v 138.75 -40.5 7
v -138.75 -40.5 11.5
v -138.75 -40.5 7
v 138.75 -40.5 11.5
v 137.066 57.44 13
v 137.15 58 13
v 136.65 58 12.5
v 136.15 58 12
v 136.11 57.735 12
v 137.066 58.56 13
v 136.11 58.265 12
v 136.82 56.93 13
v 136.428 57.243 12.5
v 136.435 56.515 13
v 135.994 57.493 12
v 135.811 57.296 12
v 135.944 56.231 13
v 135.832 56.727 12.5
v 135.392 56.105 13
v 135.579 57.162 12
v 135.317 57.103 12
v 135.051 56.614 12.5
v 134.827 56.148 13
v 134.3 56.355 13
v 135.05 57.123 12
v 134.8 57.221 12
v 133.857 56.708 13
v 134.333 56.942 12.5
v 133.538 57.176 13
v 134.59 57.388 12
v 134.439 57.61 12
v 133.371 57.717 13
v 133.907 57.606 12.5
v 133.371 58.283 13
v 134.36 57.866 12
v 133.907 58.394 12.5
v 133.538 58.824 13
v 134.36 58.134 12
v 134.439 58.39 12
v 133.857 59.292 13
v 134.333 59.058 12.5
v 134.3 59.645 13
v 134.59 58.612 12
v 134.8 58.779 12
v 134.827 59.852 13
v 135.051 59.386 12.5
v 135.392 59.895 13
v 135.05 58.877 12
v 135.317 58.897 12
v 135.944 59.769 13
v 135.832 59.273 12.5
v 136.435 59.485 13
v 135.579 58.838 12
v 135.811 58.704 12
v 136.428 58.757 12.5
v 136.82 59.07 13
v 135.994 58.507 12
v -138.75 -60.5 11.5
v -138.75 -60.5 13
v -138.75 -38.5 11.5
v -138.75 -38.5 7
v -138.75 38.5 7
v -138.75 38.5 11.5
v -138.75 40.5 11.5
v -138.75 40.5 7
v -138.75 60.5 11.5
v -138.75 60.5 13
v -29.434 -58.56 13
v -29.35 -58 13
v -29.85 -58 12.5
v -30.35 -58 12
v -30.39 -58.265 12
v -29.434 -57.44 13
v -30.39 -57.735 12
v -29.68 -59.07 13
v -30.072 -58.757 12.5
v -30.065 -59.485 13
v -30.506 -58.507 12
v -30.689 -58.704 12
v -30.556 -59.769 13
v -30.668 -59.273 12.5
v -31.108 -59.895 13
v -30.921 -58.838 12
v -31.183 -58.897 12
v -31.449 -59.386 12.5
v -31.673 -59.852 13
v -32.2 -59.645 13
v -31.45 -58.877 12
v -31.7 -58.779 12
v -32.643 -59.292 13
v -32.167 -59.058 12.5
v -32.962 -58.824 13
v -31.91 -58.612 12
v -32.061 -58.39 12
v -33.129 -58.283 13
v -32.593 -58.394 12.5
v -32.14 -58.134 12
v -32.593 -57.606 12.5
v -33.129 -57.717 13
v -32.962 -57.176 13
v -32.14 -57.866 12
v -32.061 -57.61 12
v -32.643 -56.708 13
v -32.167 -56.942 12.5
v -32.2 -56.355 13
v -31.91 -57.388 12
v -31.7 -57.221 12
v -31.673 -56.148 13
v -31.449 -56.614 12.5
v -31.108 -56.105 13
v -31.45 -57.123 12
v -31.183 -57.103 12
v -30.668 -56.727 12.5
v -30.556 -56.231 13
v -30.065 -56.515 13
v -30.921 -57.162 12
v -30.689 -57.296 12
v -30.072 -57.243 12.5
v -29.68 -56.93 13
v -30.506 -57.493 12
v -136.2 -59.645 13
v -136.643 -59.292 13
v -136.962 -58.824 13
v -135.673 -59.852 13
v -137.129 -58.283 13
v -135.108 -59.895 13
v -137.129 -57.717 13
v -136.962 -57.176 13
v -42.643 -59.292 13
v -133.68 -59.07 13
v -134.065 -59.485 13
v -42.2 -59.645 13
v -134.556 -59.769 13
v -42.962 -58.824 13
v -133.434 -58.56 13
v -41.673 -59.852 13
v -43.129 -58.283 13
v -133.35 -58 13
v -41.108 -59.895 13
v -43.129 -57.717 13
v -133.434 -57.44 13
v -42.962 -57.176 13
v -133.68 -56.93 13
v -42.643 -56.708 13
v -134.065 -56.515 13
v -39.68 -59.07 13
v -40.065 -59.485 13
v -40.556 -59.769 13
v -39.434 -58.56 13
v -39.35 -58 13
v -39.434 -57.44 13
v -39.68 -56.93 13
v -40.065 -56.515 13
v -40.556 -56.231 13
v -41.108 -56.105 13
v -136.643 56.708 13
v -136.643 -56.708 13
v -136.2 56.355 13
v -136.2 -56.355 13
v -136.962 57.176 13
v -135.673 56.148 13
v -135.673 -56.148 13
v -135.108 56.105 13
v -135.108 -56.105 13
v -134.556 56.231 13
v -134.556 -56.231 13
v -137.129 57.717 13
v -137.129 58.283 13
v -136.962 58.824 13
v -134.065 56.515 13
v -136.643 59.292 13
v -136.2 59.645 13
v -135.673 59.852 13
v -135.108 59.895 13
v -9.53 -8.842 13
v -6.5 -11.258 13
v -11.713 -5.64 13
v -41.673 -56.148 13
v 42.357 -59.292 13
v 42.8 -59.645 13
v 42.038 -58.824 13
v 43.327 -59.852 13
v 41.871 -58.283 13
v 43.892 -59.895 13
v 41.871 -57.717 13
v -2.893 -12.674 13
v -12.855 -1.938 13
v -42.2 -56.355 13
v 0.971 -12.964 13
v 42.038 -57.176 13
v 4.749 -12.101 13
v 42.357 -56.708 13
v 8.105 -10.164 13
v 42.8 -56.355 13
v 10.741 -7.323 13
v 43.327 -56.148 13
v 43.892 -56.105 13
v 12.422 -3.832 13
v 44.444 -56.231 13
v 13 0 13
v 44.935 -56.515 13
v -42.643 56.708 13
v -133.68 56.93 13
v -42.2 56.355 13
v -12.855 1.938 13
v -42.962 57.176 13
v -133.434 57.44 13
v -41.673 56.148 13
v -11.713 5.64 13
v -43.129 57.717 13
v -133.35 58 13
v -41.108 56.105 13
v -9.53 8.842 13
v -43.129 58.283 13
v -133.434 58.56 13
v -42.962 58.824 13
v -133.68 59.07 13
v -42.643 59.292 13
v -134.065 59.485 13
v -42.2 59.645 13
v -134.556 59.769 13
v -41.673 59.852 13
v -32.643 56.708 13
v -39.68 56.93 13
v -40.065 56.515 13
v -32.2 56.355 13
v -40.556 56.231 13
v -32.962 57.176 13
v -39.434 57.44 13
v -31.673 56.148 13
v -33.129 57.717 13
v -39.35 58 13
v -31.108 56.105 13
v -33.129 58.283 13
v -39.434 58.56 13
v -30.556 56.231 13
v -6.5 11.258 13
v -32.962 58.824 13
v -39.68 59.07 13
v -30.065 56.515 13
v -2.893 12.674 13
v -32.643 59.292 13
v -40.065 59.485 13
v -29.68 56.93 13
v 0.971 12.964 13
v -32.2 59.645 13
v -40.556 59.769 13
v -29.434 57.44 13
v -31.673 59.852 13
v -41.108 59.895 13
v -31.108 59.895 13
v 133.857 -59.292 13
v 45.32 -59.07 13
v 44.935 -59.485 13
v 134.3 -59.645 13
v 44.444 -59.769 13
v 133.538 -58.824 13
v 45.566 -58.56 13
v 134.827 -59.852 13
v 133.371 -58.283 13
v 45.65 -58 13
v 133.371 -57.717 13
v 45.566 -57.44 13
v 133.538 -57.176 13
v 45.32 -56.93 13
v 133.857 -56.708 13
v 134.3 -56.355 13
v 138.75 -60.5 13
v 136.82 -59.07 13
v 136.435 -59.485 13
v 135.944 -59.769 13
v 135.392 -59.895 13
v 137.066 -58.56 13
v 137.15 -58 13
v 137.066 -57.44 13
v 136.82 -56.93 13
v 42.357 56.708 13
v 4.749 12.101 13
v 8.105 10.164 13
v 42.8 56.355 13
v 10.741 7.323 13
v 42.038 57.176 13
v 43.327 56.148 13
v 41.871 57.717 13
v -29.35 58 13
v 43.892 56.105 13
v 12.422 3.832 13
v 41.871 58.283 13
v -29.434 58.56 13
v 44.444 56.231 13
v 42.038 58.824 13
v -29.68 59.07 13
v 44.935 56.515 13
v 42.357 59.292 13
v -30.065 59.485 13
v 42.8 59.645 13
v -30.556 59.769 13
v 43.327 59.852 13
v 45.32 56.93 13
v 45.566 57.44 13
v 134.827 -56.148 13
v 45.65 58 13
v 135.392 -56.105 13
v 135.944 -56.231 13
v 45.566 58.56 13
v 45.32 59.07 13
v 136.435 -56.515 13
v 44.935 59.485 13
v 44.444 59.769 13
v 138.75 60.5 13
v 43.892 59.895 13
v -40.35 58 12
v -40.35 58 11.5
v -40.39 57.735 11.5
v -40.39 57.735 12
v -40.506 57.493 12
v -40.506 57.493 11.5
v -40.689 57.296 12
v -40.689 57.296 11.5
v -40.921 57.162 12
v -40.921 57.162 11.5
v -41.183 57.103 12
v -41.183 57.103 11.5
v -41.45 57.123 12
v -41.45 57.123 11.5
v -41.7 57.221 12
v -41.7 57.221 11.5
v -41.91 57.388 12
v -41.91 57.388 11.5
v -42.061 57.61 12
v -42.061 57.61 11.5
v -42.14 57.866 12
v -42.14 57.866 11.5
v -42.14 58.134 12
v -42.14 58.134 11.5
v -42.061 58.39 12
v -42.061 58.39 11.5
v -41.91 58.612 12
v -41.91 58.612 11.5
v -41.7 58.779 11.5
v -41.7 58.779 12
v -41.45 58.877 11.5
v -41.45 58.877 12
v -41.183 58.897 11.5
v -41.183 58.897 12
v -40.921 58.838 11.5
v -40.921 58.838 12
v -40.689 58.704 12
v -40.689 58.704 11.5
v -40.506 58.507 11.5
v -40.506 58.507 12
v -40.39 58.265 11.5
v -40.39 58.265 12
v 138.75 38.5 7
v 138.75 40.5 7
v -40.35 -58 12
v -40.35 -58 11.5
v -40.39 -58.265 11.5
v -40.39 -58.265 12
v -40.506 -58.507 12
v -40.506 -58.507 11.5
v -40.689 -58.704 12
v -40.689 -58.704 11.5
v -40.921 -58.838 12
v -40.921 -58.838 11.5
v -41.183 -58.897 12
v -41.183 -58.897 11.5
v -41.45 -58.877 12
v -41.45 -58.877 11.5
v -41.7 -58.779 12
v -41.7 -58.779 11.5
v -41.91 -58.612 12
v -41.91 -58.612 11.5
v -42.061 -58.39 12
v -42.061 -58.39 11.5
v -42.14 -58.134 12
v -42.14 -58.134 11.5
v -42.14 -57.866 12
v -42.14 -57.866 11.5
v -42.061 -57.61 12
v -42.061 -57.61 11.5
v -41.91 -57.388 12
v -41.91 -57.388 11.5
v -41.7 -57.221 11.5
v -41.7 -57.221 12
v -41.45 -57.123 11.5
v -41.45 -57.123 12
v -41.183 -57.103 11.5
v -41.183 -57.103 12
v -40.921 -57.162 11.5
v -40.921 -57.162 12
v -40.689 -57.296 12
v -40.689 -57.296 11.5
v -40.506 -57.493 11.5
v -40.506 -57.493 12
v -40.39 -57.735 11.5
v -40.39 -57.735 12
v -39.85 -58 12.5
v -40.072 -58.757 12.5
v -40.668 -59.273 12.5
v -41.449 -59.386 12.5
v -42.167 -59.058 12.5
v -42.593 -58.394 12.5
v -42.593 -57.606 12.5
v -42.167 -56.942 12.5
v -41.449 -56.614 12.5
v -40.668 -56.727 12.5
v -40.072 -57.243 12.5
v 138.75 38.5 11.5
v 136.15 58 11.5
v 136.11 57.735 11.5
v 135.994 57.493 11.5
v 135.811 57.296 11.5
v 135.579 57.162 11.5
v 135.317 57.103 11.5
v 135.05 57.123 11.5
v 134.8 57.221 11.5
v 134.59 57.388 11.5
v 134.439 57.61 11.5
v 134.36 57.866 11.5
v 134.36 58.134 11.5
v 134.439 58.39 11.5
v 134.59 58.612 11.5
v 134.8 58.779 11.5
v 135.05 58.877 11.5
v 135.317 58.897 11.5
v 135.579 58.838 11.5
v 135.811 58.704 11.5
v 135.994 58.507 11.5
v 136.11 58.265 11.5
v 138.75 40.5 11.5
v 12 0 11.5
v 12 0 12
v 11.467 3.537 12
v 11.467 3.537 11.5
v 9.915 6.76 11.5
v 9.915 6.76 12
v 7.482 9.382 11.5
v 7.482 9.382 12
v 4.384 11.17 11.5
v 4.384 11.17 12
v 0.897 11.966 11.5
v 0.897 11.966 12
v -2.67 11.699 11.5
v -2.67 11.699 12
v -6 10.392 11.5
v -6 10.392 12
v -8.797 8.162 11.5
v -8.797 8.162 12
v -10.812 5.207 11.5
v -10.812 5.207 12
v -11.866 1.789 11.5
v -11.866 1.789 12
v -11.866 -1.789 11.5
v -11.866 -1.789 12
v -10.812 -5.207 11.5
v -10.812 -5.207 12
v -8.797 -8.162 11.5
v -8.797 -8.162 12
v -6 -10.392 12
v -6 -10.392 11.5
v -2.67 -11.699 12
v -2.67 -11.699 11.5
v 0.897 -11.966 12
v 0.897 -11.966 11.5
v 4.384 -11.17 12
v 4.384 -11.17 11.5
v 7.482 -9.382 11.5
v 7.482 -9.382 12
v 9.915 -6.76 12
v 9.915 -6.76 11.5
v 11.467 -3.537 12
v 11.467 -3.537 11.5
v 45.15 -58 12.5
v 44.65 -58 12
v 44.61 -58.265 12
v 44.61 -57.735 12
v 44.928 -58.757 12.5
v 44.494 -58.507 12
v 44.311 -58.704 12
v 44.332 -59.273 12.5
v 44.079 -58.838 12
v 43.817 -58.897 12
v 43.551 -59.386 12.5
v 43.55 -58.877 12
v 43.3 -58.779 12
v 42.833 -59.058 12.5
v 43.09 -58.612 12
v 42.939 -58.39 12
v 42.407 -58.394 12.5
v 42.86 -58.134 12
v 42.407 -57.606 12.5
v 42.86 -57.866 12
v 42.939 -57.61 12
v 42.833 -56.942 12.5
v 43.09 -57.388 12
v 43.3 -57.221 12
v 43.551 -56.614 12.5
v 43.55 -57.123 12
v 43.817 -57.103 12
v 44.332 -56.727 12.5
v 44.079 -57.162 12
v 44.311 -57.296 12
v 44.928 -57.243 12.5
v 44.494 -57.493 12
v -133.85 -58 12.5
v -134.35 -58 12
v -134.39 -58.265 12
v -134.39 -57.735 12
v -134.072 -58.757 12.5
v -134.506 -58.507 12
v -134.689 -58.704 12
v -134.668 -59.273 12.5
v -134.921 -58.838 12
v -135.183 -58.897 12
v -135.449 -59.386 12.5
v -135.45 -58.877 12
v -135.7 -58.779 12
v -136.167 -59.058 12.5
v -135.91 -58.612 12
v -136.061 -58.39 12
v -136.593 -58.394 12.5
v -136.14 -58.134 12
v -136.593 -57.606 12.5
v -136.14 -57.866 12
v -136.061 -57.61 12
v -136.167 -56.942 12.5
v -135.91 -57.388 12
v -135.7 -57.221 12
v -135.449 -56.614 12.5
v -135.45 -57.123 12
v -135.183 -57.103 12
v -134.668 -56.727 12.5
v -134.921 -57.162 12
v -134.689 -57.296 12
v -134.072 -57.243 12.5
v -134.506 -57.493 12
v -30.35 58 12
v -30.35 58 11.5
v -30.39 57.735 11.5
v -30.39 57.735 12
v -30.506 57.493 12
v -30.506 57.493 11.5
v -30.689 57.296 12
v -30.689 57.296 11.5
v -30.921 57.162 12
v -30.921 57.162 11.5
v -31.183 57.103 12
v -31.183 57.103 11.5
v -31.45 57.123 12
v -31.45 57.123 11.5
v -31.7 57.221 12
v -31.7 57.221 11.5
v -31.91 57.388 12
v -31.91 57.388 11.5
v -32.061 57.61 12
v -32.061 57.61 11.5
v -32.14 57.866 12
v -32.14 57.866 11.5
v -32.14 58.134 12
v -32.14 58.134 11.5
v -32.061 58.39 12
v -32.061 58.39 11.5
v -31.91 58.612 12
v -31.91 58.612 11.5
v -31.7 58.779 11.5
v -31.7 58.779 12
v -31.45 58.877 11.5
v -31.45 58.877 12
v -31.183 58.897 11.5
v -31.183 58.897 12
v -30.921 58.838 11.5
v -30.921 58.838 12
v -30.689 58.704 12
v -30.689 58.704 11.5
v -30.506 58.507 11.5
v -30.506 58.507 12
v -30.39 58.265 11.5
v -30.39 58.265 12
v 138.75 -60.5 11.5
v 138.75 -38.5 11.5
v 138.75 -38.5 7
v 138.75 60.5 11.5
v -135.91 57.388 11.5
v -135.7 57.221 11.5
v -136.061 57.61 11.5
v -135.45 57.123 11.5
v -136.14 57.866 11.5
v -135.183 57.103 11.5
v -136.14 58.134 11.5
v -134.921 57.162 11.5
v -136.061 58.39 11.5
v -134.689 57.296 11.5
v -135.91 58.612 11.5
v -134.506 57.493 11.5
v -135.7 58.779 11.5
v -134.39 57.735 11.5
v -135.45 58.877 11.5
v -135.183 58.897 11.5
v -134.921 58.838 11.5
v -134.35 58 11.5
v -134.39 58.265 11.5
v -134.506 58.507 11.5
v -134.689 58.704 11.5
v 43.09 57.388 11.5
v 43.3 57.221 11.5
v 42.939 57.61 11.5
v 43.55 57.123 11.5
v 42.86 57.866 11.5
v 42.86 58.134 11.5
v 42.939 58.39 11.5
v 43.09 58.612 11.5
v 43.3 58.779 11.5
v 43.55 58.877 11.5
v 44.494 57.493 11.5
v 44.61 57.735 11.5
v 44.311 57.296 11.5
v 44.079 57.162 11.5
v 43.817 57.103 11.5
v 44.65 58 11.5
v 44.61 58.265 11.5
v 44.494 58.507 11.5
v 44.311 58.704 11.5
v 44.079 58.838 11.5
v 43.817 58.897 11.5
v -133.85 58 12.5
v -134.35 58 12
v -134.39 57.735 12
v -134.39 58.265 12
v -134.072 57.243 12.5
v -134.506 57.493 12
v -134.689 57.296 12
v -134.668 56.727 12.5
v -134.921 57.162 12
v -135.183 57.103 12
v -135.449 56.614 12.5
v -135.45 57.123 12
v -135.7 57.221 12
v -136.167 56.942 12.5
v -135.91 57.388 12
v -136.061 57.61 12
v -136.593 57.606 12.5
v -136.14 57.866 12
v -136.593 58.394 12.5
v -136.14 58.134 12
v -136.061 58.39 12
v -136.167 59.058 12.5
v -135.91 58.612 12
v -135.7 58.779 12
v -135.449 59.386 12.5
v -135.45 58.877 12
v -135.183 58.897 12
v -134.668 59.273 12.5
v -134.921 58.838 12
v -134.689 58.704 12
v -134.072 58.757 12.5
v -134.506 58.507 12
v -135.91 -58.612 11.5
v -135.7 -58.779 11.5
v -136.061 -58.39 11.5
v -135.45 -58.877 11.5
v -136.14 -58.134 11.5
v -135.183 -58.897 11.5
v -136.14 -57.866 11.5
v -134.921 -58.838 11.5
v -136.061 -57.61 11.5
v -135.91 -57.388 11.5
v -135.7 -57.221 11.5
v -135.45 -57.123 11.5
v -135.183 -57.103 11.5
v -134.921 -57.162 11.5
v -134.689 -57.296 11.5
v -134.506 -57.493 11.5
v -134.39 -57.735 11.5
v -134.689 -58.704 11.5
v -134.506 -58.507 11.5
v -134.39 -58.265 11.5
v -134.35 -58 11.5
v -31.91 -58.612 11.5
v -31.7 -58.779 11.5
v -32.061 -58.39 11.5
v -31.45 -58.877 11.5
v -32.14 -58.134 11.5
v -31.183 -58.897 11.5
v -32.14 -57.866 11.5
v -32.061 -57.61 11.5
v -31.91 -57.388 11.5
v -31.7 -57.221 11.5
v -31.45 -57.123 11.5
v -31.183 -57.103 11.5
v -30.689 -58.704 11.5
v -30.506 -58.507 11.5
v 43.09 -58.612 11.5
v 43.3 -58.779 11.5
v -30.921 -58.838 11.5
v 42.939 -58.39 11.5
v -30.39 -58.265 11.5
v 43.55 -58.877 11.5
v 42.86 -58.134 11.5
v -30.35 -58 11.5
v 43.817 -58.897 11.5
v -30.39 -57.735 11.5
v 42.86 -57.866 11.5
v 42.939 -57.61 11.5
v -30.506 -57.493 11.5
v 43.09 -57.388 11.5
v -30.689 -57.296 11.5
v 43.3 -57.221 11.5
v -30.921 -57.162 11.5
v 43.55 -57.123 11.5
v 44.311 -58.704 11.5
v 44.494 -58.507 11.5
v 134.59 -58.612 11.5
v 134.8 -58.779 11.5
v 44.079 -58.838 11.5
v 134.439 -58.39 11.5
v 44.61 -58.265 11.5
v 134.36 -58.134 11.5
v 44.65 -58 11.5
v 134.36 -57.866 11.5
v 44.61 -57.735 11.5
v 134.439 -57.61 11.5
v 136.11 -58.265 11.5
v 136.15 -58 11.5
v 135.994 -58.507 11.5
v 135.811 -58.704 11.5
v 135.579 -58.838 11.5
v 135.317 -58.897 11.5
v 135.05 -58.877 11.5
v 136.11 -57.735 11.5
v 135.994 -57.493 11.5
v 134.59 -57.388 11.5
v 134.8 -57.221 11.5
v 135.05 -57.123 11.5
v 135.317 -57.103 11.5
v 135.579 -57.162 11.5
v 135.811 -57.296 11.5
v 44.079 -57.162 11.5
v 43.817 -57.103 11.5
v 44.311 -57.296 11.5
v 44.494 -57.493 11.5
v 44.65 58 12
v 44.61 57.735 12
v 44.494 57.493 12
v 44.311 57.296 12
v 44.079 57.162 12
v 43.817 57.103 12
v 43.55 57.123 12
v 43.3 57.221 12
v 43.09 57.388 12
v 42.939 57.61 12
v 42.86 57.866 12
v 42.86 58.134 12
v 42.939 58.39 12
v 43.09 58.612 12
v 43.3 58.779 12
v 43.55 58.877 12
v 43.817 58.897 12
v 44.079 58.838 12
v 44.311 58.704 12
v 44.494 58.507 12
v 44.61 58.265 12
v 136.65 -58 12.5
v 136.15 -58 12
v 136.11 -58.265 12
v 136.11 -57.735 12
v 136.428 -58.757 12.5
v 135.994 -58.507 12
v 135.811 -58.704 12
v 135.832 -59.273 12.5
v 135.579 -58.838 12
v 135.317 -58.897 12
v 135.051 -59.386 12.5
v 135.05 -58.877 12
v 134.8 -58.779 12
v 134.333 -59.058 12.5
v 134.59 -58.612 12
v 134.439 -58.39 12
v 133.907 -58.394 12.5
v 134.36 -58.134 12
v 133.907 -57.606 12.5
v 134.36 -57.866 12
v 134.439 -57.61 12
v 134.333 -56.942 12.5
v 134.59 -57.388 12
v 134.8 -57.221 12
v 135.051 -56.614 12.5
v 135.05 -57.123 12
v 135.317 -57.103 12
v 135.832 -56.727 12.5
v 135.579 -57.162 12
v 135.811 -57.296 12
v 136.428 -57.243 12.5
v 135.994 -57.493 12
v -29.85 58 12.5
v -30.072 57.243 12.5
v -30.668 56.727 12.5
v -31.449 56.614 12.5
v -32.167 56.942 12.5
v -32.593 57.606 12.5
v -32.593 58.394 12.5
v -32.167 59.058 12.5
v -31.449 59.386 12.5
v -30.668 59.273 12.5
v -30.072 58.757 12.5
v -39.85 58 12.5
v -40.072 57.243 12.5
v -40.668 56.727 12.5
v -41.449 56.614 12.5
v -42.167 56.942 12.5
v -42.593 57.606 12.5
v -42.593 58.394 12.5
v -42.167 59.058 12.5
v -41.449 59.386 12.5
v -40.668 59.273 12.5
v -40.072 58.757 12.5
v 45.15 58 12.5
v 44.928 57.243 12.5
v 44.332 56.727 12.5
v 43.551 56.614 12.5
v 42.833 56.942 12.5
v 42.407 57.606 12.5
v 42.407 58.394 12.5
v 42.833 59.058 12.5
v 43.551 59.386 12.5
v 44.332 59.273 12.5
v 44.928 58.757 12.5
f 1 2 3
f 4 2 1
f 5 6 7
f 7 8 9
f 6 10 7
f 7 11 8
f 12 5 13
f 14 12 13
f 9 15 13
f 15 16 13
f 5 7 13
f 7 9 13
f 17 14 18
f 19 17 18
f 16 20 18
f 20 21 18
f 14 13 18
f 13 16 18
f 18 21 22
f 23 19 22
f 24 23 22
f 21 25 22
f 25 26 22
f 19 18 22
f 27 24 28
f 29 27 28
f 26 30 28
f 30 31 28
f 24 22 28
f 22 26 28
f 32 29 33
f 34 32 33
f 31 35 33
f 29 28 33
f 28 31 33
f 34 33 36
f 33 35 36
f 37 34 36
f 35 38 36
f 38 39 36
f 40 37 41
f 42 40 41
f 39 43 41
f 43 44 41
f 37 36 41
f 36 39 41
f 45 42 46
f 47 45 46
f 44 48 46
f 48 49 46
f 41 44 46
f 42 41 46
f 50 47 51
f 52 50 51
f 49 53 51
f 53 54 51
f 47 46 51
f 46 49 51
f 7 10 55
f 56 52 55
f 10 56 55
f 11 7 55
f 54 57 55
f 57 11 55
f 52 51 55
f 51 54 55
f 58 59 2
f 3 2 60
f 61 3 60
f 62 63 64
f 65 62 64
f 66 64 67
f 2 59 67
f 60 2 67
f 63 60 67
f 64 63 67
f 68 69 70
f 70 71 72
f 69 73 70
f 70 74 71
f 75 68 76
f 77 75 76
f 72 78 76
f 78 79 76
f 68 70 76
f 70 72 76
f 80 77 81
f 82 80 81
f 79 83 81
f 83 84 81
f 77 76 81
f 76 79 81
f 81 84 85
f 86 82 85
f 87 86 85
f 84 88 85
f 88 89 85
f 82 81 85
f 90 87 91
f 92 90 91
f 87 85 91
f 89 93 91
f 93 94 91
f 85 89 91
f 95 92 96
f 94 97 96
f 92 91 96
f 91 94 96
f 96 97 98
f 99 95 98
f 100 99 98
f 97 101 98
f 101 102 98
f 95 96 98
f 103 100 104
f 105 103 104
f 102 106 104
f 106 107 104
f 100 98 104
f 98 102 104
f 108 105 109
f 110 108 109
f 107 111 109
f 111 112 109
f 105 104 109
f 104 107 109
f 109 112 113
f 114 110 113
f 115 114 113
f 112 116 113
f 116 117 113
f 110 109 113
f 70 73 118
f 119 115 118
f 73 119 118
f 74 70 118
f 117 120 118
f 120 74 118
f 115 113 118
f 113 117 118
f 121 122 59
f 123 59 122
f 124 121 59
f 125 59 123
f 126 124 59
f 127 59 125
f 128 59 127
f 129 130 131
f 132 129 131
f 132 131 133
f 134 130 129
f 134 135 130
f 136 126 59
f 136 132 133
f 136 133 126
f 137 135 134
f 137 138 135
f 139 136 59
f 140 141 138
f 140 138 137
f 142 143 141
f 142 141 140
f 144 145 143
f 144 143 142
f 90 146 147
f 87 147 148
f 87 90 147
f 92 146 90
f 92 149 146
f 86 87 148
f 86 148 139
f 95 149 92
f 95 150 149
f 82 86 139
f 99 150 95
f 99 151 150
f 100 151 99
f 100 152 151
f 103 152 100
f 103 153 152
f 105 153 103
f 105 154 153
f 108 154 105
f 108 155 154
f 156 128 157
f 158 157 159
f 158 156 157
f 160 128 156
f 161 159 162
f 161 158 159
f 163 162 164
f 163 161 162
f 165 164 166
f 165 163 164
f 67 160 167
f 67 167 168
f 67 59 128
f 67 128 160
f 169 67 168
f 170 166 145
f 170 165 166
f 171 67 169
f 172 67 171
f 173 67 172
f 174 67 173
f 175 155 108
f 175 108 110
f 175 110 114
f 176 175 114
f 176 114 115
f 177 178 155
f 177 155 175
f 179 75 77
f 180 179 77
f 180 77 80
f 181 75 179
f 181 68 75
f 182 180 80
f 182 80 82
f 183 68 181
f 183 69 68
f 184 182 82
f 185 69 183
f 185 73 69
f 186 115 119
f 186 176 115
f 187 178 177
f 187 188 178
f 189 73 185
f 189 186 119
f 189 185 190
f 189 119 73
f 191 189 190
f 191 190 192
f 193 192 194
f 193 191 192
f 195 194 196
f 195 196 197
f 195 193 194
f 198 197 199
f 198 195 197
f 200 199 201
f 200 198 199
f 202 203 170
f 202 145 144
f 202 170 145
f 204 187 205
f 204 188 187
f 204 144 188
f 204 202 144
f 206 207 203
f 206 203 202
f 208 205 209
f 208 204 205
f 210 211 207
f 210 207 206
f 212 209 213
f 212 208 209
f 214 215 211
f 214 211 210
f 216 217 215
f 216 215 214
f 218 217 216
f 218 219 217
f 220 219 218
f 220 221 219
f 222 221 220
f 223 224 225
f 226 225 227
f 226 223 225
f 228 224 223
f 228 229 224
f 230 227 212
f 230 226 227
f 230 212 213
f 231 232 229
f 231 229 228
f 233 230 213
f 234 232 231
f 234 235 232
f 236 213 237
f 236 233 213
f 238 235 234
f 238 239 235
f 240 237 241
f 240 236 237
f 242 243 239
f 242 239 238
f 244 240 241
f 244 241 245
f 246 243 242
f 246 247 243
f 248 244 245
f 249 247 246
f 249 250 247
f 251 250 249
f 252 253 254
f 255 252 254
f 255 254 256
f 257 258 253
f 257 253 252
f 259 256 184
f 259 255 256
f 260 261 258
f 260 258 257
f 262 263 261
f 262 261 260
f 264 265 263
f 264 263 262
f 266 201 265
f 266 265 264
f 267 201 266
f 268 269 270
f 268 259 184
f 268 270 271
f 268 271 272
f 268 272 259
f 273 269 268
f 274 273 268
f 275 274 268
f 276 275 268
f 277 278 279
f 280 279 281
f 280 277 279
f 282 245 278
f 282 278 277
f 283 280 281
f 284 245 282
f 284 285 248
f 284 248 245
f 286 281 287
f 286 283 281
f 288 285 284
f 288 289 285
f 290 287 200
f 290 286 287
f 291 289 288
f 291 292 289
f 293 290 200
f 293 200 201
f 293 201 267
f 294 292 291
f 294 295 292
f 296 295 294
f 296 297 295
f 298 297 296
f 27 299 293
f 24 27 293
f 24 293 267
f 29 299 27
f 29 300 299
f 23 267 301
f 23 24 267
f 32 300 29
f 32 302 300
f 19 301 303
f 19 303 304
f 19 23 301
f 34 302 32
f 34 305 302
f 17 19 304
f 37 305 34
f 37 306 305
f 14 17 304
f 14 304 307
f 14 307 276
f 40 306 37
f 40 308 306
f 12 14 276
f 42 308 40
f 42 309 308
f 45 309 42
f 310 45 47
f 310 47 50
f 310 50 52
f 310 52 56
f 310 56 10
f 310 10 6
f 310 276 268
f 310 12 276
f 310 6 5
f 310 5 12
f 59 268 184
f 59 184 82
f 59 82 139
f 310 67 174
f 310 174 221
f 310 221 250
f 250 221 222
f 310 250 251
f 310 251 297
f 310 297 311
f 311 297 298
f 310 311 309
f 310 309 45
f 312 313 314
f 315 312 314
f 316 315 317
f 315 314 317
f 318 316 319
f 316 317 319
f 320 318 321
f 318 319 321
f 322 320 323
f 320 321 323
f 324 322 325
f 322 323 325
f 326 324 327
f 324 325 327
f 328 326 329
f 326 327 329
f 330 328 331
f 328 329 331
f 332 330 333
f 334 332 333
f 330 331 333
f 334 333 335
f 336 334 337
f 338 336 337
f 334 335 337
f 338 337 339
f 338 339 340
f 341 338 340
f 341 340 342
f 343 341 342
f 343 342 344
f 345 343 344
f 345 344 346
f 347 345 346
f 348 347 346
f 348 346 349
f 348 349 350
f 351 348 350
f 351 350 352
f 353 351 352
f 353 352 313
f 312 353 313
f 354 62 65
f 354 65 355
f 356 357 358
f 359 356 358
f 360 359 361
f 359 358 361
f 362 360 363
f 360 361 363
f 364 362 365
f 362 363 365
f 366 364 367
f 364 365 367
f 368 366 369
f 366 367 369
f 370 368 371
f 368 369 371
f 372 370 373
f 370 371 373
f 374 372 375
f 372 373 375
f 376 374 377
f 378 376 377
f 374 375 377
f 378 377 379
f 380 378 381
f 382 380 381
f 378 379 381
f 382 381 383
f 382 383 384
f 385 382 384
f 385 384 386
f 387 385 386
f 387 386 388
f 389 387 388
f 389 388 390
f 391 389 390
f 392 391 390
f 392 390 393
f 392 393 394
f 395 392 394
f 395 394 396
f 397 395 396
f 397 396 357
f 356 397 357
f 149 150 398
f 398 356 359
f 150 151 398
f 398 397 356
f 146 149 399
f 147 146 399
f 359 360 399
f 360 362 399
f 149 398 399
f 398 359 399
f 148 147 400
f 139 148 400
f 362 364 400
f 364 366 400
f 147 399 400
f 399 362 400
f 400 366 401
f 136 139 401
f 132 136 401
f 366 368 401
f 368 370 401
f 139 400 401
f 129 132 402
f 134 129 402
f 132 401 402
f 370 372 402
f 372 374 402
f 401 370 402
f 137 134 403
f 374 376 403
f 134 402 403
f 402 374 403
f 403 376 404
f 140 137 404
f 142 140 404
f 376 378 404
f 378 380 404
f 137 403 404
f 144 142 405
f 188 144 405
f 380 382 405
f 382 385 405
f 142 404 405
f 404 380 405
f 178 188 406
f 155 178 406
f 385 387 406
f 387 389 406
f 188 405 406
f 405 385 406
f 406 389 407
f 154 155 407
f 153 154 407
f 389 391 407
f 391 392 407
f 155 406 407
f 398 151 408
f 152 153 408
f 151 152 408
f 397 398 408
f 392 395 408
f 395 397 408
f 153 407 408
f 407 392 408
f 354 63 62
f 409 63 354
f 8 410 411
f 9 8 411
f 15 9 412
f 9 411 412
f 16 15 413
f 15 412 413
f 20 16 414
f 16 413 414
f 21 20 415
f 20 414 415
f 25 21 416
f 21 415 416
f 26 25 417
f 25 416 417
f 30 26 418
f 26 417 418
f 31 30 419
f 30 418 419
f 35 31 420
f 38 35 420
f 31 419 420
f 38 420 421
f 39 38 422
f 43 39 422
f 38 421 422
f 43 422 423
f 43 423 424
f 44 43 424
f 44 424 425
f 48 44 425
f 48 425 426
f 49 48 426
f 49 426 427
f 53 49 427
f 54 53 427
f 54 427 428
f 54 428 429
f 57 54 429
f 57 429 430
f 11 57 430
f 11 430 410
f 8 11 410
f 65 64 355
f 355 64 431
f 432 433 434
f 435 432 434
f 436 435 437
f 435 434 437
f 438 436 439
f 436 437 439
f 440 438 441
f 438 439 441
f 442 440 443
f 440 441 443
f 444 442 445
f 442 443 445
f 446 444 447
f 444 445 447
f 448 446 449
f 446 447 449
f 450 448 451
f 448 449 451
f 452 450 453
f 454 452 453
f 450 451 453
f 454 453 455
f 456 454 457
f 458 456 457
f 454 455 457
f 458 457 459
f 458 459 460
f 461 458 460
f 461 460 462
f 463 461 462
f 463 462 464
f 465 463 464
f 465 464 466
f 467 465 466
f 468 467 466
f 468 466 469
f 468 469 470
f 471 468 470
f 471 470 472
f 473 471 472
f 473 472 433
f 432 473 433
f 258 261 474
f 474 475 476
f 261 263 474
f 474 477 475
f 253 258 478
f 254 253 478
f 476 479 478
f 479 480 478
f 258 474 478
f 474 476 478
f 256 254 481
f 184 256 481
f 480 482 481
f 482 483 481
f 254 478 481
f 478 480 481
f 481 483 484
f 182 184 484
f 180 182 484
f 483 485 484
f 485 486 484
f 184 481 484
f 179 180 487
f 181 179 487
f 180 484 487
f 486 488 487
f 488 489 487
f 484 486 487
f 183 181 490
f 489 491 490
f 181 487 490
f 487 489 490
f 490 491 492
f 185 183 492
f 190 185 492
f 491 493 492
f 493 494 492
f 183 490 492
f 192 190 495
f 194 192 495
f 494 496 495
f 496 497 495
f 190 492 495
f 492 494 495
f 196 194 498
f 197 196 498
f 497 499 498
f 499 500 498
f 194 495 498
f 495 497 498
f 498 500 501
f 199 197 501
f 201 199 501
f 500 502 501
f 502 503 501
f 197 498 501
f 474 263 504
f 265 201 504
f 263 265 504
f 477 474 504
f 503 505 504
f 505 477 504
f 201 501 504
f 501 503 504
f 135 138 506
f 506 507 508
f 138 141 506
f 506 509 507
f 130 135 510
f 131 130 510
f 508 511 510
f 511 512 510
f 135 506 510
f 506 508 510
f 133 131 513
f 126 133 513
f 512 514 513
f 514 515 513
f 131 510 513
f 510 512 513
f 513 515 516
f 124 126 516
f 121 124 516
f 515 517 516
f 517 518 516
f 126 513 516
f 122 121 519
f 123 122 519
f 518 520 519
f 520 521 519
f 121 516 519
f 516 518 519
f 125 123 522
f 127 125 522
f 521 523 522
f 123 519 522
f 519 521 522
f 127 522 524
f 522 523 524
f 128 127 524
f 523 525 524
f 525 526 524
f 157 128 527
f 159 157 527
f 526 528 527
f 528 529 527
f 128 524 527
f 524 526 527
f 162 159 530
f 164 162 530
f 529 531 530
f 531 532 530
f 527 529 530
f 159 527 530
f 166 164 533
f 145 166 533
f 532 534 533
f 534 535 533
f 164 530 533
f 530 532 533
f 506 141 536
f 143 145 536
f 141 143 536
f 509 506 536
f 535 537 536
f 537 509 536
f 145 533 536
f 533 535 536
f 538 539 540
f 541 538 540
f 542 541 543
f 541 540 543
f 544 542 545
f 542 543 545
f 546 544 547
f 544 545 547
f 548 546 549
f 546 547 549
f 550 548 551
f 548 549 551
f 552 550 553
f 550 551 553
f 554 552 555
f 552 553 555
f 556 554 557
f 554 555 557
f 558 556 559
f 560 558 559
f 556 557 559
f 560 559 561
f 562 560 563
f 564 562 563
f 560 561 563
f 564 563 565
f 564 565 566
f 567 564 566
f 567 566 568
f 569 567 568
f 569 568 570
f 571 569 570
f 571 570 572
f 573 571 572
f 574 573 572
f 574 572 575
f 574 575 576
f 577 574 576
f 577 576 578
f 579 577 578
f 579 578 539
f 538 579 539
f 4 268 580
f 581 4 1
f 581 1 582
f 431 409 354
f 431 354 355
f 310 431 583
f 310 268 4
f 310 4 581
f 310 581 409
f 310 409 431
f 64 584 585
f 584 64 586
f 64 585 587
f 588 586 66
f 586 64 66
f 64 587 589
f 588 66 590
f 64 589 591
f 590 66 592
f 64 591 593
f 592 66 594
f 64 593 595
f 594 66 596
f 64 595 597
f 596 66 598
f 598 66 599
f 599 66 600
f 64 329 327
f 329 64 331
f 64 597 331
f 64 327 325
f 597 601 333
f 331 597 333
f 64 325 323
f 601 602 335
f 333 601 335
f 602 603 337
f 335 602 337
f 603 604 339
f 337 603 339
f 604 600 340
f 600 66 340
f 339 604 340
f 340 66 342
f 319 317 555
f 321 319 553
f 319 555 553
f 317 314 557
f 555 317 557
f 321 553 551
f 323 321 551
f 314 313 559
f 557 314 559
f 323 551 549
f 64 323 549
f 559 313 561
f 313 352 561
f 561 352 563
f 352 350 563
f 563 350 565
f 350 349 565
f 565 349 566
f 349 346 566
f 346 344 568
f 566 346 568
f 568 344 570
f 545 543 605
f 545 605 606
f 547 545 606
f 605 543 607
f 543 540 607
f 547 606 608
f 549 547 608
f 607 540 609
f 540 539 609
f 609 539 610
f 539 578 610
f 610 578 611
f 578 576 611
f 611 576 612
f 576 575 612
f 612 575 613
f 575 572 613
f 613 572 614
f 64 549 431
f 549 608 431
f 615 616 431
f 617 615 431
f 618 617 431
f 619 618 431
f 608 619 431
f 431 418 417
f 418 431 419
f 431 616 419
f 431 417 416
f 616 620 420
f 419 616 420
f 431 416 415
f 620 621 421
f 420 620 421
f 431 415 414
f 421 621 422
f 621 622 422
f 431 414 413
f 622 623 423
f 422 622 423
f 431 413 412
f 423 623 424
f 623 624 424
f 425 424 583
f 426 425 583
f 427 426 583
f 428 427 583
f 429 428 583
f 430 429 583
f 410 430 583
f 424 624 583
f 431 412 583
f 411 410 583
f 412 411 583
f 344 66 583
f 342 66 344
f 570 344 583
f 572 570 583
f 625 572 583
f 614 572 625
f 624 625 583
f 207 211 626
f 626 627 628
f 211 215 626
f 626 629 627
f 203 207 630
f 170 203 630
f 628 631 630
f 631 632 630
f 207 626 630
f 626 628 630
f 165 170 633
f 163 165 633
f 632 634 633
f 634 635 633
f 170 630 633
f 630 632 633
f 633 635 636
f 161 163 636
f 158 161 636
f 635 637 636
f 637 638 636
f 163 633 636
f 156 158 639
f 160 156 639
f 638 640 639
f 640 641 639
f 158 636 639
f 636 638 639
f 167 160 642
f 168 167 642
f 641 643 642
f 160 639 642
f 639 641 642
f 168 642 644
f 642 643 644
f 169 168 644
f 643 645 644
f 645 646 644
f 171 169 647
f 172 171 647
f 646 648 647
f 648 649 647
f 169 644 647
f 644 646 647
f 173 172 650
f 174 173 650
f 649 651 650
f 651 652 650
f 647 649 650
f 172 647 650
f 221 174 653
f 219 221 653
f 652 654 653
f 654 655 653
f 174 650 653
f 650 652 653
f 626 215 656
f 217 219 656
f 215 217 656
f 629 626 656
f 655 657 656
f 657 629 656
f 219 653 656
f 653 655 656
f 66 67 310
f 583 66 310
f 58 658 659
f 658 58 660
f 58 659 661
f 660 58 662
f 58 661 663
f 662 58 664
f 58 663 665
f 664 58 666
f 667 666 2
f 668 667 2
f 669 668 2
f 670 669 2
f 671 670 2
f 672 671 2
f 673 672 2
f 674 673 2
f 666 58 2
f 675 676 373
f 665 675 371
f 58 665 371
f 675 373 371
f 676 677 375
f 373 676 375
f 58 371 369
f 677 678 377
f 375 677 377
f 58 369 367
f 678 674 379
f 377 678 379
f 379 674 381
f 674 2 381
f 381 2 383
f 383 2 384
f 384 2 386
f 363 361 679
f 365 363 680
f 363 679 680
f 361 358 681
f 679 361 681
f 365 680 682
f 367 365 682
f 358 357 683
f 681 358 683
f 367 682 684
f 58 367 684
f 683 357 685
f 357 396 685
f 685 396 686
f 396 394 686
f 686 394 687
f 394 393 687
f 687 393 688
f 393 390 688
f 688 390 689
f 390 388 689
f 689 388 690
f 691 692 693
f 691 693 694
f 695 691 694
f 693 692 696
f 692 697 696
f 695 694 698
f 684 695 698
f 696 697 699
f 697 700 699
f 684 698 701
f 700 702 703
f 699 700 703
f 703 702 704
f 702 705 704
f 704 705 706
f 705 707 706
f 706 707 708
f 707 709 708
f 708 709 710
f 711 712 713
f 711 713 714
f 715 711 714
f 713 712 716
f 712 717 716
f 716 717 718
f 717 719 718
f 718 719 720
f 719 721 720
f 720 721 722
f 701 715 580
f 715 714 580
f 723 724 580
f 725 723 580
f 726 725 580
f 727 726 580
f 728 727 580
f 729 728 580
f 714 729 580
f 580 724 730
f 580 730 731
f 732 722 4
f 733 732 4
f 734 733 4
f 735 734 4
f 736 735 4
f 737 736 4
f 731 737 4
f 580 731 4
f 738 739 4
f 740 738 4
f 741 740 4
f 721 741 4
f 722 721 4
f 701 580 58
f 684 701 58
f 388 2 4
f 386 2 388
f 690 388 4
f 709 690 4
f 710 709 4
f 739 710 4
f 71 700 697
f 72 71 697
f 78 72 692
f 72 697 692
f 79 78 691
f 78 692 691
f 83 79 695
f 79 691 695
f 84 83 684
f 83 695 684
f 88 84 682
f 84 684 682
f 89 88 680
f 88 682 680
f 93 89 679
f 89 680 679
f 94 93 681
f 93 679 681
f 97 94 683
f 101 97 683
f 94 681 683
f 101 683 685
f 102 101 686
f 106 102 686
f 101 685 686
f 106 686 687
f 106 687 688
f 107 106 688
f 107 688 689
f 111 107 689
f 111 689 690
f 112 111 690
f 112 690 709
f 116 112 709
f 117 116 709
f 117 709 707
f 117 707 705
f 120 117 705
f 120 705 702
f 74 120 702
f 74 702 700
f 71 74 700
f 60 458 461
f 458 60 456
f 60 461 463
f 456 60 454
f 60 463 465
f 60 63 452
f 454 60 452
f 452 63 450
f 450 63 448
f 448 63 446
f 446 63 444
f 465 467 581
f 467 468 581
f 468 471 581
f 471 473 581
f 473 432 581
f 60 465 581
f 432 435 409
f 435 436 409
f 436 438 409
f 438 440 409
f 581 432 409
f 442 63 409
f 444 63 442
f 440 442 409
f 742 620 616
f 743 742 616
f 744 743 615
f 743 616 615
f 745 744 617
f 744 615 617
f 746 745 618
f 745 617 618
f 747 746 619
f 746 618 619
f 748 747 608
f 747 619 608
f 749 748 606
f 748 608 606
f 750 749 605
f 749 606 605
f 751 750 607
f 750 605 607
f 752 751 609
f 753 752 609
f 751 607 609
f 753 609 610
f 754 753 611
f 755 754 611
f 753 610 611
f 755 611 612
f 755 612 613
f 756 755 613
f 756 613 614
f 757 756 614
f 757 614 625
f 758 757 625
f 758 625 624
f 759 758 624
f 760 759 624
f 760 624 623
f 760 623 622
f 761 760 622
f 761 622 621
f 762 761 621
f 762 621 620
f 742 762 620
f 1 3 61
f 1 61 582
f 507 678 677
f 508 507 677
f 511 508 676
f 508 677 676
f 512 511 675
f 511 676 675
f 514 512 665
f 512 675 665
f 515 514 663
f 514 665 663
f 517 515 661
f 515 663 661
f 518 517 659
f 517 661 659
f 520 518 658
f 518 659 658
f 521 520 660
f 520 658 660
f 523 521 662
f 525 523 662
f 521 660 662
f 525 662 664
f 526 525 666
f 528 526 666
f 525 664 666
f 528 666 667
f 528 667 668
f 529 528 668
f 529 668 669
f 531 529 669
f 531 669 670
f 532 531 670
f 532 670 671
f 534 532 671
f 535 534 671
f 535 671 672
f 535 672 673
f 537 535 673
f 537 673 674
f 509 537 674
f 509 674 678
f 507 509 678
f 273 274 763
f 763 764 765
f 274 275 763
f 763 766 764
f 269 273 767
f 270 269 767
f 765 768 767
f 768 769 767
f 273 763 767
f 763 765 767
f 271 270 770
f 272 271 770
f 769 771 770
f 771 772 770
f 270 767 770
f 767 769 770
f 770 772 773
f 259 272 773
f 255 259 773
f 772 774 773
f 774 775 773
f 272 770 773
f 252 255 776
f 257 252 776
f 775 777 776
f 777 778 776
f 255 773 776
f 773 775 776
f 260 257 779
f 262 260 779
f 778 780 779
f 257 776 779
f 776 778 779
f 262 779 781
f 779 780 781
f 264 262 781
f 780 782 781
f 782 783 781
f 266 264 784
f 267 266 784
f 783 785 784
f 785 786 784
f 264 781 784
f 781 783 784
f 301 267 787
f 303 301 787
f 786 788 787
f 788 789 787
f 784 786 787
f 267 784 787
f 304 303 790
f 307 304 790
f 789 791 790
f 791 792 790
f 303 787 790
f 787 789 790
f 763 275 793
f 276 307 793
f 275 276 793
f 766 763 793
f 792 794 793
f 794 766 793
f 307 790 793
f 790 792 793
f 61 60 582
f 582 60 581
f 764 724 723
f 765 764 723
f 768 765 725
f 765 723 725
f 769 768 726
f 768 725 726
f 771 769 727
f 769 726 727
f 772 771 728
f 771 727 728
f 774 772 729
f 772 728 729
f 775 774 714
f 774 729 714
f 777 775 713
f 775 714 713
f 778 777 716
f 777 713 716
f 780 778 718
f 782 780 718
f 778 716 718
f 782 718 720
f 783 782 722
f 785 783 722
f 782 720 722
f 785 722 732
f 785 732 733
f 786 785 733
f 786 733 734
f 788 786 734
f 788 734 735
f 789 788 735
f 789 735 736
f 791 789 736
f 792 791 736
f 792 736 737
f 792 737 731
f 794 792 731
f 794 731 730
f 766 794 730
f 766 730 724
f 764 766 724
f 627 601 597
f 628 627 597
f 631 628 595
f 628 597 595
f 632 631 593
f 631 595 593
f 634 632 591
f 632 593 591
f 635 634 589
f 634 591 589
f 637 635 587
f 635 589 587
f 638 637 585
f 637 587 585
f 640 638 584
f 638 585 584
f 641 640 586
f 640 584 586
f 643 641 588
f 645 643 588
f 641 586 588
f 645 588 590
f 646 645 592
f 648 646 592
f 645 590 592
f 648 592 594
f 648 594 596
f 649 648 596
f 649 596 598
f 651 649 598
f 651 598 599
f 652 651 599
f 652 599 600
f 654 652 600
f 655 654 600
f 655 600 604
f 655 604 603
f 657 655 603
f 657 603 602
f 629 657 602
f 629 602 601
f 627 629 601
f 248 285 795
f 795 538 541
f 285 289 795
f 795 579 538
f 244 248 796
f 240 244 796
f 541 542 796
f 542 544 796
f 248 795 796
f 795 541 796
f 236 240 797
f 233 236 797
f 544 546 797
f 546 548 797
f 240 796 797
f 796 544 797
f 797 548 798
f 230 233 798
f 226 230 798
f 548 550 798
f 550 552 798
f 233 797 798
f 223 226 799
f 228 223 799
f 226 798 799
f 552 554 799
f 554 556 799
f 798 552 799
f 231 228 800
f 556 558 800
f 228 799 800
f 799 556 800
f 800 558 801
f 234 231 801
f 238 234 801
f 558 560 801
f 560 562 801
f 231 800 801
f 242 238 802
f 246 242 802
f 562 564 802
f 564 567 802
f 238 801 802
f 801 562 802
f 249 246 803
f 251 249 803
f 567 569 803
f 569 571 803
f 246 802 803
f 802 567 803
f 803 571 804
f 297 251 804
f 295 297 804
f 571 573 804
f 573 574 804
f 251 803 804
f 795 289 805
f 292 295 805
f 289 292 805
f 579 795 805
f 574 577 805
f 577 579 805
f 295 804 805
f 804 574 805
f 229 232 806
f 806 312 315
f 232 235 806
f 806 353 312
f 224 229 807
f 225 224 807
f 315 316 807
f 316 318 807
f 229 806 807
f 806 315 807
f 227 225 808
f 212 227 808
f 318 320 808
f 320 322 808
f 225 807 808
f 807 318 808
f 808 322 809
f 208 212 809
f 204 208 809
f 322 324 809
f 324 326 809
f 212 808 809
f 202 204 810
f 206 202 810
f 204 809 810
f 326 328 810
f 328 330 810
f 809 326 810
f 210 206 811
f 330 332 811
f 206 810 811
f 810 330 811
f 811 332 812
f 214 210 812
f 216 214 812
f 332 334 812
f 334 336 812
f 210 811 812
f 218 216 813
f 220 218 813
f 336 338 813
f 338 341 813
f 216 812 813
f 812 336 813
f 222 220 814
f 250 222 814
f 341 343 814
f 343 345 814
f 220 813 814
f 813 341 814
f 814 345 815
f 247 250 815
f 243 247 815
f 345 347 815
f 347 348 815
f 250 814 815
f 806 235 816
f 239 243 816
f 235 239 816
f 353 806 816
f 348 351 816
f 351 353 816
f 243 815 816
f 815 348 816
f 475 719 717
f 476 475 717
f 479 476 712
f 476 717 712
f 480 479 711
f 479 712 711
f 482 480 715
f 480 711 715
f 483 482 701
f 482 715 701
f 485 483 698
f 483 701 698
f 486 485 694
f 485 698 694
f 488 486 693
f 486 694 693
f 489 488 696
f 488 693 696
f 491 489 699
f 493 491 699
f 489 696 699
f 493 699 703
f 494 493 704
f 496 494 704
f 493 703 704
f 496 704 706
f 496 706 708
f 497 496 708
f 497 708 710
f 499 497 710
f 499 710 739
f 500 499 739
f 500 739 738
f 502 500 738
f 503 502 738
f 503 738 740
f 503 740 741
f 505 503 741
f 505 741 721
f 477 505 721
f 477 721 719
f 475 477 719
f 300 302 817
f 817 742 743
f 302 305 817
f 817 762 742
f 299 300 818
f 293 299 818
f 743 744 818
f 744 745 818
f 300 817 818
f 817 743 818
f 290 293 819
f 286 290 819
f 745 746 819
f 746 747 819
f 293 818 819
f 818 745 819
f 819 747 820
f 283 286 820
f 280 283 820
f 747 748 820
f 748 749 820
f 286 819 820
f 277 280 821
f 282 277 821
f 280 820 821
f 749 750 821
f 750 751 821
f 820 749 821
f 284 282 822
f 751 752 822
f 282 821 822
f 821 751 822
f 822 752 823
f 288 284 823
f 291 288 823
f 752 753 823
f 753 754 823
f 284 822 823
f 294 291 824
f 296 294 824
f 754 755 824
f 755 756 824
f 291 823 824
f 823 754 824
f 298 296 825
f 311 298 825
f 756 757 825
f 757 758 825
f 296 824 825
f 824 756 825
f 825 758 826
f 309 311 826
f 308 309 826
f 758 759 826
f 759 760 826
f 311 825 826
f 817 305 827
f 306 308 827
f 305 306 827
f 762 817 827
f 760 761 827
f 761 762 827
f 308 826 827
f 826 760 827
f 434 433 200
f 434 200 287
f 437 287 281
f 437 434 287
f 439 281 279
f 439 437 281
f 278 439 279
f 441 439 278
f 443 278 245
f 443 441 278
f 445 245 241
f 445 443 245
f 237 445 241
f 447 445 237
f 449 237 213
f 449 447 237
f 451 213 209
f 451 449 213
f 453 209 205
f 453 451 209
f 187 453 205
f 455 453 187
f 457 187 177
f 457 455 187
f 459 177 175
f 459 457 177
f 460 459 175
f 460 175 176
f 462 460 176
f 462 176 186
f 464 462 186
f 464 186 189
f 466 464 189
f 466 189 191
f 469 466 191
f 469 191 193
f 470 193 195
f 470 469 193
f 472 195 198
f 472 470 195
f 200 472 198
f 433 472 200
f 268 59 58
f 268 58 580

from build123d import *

# Parameters (mm, degrees)
SKETCH017_W     = 277.5
SKETCH017_H     = 121
PAD007_DEPTH    = 1.5
SKETCH018_R     = 0.9
POCKET006_DEPTH = 1.501
SKETCH025_W     = 277.5
SKETCH025_H     = 2
PAD009_DEPTH    = 4.5
SKETCH026_R     = 12
POCKET007_DEPTH = 6.001
CHAMFER_SIZE    = 1


with BuildPart() as part:
    # Sketch017 → Pad007 (new body)
    with BuildSketch(Plane.XY.offset(13)):
        Rectangle(SKETCH017_W, SKETCH017_H)
    extrude(amount=-PAD007_DEPTH)

    # Sketch018 (on Face6 of Pad007) → Pocket006 (cut, through all)
    with BuildSketch(Plane(origin=(0, 0, 11.5), x_dir=(1, 0, 0), z_dir=(0, 0, -1))):
        with Locations((-135.25, 58)):
            Circle(SKETCH018_R)
        with Locations((-41.25, 58)):
            Circle(SKETCH018_R)
        with Locations((-31.25, 58)):
            Circle(SKETCH018_R)
        with Locations((43.75, 58)):
            Circle(SKETCH018_R)
        with Locations((135.25, 58)):
            Circle(SKETCH018_R)
        with Locations((135.25, -58)):
            Circle(SKETCH018_R)
        with Locations((43.75, -58)):
            Circle(SKETCH018_R)
        with Locations((-31.25, -58)):
            Circle(SKETCH018_R)
        with Locations((-41.25, -58)):
            Circle(SKETCH018_R)
        with Locations((-135.25, -58)):
            Circle(SKETCH018_R)
    extrude(amount=-POCKET006_DEPTH, mode=Mode.SUBTRACT)

    # Sketch025 (on Face5 of Pocket006) → Pad009 (join)
    with BuildSketch(Plane(origin=(0, 0, 11.5), x_dir=(1, 0, 0), z_dir=(0, 0, -1))):
        with Locations((0, 39.5)):
            Rectangle(SKETCH025_W, SKETCH025_H)
        with Locations((0, -39.5)):
            Rectangle(SKETCH025_W, SKETCH025_H)
    extrude(amount=PAD009_DEPTH)

    # Sketch026 (on Face2 of Pad009) → Pocket007 (cut, through all)
    with BuildSketch(Plane.XY.offset(13)):
        Circle(SKETCH026_R)
    extrude(amount=-POCKET007_DEPTH, mode=Mode.SUBTRACT)

    # Chamfer
    chamfer_edges = [part.edges().sort_by_distance(p)[0] for p in [
        (134.35, -58, 13),
        (42.85, -58, 13),
        (-32.15, -58, 13),
        (-42.15, -58, 13),
        (-136.15, -58, 13),
        (-136.15, 58, 13),
        (-42.15, 58, 13),
        (-32.15, 58, 13),
        (42.85, 58, 13),
        (134.35, 58, 13),
        (-12, 0, 13),
    ]]
    chamfer(chamfer_edges, length=CHAMFER_SIZE)


solid = part.part
